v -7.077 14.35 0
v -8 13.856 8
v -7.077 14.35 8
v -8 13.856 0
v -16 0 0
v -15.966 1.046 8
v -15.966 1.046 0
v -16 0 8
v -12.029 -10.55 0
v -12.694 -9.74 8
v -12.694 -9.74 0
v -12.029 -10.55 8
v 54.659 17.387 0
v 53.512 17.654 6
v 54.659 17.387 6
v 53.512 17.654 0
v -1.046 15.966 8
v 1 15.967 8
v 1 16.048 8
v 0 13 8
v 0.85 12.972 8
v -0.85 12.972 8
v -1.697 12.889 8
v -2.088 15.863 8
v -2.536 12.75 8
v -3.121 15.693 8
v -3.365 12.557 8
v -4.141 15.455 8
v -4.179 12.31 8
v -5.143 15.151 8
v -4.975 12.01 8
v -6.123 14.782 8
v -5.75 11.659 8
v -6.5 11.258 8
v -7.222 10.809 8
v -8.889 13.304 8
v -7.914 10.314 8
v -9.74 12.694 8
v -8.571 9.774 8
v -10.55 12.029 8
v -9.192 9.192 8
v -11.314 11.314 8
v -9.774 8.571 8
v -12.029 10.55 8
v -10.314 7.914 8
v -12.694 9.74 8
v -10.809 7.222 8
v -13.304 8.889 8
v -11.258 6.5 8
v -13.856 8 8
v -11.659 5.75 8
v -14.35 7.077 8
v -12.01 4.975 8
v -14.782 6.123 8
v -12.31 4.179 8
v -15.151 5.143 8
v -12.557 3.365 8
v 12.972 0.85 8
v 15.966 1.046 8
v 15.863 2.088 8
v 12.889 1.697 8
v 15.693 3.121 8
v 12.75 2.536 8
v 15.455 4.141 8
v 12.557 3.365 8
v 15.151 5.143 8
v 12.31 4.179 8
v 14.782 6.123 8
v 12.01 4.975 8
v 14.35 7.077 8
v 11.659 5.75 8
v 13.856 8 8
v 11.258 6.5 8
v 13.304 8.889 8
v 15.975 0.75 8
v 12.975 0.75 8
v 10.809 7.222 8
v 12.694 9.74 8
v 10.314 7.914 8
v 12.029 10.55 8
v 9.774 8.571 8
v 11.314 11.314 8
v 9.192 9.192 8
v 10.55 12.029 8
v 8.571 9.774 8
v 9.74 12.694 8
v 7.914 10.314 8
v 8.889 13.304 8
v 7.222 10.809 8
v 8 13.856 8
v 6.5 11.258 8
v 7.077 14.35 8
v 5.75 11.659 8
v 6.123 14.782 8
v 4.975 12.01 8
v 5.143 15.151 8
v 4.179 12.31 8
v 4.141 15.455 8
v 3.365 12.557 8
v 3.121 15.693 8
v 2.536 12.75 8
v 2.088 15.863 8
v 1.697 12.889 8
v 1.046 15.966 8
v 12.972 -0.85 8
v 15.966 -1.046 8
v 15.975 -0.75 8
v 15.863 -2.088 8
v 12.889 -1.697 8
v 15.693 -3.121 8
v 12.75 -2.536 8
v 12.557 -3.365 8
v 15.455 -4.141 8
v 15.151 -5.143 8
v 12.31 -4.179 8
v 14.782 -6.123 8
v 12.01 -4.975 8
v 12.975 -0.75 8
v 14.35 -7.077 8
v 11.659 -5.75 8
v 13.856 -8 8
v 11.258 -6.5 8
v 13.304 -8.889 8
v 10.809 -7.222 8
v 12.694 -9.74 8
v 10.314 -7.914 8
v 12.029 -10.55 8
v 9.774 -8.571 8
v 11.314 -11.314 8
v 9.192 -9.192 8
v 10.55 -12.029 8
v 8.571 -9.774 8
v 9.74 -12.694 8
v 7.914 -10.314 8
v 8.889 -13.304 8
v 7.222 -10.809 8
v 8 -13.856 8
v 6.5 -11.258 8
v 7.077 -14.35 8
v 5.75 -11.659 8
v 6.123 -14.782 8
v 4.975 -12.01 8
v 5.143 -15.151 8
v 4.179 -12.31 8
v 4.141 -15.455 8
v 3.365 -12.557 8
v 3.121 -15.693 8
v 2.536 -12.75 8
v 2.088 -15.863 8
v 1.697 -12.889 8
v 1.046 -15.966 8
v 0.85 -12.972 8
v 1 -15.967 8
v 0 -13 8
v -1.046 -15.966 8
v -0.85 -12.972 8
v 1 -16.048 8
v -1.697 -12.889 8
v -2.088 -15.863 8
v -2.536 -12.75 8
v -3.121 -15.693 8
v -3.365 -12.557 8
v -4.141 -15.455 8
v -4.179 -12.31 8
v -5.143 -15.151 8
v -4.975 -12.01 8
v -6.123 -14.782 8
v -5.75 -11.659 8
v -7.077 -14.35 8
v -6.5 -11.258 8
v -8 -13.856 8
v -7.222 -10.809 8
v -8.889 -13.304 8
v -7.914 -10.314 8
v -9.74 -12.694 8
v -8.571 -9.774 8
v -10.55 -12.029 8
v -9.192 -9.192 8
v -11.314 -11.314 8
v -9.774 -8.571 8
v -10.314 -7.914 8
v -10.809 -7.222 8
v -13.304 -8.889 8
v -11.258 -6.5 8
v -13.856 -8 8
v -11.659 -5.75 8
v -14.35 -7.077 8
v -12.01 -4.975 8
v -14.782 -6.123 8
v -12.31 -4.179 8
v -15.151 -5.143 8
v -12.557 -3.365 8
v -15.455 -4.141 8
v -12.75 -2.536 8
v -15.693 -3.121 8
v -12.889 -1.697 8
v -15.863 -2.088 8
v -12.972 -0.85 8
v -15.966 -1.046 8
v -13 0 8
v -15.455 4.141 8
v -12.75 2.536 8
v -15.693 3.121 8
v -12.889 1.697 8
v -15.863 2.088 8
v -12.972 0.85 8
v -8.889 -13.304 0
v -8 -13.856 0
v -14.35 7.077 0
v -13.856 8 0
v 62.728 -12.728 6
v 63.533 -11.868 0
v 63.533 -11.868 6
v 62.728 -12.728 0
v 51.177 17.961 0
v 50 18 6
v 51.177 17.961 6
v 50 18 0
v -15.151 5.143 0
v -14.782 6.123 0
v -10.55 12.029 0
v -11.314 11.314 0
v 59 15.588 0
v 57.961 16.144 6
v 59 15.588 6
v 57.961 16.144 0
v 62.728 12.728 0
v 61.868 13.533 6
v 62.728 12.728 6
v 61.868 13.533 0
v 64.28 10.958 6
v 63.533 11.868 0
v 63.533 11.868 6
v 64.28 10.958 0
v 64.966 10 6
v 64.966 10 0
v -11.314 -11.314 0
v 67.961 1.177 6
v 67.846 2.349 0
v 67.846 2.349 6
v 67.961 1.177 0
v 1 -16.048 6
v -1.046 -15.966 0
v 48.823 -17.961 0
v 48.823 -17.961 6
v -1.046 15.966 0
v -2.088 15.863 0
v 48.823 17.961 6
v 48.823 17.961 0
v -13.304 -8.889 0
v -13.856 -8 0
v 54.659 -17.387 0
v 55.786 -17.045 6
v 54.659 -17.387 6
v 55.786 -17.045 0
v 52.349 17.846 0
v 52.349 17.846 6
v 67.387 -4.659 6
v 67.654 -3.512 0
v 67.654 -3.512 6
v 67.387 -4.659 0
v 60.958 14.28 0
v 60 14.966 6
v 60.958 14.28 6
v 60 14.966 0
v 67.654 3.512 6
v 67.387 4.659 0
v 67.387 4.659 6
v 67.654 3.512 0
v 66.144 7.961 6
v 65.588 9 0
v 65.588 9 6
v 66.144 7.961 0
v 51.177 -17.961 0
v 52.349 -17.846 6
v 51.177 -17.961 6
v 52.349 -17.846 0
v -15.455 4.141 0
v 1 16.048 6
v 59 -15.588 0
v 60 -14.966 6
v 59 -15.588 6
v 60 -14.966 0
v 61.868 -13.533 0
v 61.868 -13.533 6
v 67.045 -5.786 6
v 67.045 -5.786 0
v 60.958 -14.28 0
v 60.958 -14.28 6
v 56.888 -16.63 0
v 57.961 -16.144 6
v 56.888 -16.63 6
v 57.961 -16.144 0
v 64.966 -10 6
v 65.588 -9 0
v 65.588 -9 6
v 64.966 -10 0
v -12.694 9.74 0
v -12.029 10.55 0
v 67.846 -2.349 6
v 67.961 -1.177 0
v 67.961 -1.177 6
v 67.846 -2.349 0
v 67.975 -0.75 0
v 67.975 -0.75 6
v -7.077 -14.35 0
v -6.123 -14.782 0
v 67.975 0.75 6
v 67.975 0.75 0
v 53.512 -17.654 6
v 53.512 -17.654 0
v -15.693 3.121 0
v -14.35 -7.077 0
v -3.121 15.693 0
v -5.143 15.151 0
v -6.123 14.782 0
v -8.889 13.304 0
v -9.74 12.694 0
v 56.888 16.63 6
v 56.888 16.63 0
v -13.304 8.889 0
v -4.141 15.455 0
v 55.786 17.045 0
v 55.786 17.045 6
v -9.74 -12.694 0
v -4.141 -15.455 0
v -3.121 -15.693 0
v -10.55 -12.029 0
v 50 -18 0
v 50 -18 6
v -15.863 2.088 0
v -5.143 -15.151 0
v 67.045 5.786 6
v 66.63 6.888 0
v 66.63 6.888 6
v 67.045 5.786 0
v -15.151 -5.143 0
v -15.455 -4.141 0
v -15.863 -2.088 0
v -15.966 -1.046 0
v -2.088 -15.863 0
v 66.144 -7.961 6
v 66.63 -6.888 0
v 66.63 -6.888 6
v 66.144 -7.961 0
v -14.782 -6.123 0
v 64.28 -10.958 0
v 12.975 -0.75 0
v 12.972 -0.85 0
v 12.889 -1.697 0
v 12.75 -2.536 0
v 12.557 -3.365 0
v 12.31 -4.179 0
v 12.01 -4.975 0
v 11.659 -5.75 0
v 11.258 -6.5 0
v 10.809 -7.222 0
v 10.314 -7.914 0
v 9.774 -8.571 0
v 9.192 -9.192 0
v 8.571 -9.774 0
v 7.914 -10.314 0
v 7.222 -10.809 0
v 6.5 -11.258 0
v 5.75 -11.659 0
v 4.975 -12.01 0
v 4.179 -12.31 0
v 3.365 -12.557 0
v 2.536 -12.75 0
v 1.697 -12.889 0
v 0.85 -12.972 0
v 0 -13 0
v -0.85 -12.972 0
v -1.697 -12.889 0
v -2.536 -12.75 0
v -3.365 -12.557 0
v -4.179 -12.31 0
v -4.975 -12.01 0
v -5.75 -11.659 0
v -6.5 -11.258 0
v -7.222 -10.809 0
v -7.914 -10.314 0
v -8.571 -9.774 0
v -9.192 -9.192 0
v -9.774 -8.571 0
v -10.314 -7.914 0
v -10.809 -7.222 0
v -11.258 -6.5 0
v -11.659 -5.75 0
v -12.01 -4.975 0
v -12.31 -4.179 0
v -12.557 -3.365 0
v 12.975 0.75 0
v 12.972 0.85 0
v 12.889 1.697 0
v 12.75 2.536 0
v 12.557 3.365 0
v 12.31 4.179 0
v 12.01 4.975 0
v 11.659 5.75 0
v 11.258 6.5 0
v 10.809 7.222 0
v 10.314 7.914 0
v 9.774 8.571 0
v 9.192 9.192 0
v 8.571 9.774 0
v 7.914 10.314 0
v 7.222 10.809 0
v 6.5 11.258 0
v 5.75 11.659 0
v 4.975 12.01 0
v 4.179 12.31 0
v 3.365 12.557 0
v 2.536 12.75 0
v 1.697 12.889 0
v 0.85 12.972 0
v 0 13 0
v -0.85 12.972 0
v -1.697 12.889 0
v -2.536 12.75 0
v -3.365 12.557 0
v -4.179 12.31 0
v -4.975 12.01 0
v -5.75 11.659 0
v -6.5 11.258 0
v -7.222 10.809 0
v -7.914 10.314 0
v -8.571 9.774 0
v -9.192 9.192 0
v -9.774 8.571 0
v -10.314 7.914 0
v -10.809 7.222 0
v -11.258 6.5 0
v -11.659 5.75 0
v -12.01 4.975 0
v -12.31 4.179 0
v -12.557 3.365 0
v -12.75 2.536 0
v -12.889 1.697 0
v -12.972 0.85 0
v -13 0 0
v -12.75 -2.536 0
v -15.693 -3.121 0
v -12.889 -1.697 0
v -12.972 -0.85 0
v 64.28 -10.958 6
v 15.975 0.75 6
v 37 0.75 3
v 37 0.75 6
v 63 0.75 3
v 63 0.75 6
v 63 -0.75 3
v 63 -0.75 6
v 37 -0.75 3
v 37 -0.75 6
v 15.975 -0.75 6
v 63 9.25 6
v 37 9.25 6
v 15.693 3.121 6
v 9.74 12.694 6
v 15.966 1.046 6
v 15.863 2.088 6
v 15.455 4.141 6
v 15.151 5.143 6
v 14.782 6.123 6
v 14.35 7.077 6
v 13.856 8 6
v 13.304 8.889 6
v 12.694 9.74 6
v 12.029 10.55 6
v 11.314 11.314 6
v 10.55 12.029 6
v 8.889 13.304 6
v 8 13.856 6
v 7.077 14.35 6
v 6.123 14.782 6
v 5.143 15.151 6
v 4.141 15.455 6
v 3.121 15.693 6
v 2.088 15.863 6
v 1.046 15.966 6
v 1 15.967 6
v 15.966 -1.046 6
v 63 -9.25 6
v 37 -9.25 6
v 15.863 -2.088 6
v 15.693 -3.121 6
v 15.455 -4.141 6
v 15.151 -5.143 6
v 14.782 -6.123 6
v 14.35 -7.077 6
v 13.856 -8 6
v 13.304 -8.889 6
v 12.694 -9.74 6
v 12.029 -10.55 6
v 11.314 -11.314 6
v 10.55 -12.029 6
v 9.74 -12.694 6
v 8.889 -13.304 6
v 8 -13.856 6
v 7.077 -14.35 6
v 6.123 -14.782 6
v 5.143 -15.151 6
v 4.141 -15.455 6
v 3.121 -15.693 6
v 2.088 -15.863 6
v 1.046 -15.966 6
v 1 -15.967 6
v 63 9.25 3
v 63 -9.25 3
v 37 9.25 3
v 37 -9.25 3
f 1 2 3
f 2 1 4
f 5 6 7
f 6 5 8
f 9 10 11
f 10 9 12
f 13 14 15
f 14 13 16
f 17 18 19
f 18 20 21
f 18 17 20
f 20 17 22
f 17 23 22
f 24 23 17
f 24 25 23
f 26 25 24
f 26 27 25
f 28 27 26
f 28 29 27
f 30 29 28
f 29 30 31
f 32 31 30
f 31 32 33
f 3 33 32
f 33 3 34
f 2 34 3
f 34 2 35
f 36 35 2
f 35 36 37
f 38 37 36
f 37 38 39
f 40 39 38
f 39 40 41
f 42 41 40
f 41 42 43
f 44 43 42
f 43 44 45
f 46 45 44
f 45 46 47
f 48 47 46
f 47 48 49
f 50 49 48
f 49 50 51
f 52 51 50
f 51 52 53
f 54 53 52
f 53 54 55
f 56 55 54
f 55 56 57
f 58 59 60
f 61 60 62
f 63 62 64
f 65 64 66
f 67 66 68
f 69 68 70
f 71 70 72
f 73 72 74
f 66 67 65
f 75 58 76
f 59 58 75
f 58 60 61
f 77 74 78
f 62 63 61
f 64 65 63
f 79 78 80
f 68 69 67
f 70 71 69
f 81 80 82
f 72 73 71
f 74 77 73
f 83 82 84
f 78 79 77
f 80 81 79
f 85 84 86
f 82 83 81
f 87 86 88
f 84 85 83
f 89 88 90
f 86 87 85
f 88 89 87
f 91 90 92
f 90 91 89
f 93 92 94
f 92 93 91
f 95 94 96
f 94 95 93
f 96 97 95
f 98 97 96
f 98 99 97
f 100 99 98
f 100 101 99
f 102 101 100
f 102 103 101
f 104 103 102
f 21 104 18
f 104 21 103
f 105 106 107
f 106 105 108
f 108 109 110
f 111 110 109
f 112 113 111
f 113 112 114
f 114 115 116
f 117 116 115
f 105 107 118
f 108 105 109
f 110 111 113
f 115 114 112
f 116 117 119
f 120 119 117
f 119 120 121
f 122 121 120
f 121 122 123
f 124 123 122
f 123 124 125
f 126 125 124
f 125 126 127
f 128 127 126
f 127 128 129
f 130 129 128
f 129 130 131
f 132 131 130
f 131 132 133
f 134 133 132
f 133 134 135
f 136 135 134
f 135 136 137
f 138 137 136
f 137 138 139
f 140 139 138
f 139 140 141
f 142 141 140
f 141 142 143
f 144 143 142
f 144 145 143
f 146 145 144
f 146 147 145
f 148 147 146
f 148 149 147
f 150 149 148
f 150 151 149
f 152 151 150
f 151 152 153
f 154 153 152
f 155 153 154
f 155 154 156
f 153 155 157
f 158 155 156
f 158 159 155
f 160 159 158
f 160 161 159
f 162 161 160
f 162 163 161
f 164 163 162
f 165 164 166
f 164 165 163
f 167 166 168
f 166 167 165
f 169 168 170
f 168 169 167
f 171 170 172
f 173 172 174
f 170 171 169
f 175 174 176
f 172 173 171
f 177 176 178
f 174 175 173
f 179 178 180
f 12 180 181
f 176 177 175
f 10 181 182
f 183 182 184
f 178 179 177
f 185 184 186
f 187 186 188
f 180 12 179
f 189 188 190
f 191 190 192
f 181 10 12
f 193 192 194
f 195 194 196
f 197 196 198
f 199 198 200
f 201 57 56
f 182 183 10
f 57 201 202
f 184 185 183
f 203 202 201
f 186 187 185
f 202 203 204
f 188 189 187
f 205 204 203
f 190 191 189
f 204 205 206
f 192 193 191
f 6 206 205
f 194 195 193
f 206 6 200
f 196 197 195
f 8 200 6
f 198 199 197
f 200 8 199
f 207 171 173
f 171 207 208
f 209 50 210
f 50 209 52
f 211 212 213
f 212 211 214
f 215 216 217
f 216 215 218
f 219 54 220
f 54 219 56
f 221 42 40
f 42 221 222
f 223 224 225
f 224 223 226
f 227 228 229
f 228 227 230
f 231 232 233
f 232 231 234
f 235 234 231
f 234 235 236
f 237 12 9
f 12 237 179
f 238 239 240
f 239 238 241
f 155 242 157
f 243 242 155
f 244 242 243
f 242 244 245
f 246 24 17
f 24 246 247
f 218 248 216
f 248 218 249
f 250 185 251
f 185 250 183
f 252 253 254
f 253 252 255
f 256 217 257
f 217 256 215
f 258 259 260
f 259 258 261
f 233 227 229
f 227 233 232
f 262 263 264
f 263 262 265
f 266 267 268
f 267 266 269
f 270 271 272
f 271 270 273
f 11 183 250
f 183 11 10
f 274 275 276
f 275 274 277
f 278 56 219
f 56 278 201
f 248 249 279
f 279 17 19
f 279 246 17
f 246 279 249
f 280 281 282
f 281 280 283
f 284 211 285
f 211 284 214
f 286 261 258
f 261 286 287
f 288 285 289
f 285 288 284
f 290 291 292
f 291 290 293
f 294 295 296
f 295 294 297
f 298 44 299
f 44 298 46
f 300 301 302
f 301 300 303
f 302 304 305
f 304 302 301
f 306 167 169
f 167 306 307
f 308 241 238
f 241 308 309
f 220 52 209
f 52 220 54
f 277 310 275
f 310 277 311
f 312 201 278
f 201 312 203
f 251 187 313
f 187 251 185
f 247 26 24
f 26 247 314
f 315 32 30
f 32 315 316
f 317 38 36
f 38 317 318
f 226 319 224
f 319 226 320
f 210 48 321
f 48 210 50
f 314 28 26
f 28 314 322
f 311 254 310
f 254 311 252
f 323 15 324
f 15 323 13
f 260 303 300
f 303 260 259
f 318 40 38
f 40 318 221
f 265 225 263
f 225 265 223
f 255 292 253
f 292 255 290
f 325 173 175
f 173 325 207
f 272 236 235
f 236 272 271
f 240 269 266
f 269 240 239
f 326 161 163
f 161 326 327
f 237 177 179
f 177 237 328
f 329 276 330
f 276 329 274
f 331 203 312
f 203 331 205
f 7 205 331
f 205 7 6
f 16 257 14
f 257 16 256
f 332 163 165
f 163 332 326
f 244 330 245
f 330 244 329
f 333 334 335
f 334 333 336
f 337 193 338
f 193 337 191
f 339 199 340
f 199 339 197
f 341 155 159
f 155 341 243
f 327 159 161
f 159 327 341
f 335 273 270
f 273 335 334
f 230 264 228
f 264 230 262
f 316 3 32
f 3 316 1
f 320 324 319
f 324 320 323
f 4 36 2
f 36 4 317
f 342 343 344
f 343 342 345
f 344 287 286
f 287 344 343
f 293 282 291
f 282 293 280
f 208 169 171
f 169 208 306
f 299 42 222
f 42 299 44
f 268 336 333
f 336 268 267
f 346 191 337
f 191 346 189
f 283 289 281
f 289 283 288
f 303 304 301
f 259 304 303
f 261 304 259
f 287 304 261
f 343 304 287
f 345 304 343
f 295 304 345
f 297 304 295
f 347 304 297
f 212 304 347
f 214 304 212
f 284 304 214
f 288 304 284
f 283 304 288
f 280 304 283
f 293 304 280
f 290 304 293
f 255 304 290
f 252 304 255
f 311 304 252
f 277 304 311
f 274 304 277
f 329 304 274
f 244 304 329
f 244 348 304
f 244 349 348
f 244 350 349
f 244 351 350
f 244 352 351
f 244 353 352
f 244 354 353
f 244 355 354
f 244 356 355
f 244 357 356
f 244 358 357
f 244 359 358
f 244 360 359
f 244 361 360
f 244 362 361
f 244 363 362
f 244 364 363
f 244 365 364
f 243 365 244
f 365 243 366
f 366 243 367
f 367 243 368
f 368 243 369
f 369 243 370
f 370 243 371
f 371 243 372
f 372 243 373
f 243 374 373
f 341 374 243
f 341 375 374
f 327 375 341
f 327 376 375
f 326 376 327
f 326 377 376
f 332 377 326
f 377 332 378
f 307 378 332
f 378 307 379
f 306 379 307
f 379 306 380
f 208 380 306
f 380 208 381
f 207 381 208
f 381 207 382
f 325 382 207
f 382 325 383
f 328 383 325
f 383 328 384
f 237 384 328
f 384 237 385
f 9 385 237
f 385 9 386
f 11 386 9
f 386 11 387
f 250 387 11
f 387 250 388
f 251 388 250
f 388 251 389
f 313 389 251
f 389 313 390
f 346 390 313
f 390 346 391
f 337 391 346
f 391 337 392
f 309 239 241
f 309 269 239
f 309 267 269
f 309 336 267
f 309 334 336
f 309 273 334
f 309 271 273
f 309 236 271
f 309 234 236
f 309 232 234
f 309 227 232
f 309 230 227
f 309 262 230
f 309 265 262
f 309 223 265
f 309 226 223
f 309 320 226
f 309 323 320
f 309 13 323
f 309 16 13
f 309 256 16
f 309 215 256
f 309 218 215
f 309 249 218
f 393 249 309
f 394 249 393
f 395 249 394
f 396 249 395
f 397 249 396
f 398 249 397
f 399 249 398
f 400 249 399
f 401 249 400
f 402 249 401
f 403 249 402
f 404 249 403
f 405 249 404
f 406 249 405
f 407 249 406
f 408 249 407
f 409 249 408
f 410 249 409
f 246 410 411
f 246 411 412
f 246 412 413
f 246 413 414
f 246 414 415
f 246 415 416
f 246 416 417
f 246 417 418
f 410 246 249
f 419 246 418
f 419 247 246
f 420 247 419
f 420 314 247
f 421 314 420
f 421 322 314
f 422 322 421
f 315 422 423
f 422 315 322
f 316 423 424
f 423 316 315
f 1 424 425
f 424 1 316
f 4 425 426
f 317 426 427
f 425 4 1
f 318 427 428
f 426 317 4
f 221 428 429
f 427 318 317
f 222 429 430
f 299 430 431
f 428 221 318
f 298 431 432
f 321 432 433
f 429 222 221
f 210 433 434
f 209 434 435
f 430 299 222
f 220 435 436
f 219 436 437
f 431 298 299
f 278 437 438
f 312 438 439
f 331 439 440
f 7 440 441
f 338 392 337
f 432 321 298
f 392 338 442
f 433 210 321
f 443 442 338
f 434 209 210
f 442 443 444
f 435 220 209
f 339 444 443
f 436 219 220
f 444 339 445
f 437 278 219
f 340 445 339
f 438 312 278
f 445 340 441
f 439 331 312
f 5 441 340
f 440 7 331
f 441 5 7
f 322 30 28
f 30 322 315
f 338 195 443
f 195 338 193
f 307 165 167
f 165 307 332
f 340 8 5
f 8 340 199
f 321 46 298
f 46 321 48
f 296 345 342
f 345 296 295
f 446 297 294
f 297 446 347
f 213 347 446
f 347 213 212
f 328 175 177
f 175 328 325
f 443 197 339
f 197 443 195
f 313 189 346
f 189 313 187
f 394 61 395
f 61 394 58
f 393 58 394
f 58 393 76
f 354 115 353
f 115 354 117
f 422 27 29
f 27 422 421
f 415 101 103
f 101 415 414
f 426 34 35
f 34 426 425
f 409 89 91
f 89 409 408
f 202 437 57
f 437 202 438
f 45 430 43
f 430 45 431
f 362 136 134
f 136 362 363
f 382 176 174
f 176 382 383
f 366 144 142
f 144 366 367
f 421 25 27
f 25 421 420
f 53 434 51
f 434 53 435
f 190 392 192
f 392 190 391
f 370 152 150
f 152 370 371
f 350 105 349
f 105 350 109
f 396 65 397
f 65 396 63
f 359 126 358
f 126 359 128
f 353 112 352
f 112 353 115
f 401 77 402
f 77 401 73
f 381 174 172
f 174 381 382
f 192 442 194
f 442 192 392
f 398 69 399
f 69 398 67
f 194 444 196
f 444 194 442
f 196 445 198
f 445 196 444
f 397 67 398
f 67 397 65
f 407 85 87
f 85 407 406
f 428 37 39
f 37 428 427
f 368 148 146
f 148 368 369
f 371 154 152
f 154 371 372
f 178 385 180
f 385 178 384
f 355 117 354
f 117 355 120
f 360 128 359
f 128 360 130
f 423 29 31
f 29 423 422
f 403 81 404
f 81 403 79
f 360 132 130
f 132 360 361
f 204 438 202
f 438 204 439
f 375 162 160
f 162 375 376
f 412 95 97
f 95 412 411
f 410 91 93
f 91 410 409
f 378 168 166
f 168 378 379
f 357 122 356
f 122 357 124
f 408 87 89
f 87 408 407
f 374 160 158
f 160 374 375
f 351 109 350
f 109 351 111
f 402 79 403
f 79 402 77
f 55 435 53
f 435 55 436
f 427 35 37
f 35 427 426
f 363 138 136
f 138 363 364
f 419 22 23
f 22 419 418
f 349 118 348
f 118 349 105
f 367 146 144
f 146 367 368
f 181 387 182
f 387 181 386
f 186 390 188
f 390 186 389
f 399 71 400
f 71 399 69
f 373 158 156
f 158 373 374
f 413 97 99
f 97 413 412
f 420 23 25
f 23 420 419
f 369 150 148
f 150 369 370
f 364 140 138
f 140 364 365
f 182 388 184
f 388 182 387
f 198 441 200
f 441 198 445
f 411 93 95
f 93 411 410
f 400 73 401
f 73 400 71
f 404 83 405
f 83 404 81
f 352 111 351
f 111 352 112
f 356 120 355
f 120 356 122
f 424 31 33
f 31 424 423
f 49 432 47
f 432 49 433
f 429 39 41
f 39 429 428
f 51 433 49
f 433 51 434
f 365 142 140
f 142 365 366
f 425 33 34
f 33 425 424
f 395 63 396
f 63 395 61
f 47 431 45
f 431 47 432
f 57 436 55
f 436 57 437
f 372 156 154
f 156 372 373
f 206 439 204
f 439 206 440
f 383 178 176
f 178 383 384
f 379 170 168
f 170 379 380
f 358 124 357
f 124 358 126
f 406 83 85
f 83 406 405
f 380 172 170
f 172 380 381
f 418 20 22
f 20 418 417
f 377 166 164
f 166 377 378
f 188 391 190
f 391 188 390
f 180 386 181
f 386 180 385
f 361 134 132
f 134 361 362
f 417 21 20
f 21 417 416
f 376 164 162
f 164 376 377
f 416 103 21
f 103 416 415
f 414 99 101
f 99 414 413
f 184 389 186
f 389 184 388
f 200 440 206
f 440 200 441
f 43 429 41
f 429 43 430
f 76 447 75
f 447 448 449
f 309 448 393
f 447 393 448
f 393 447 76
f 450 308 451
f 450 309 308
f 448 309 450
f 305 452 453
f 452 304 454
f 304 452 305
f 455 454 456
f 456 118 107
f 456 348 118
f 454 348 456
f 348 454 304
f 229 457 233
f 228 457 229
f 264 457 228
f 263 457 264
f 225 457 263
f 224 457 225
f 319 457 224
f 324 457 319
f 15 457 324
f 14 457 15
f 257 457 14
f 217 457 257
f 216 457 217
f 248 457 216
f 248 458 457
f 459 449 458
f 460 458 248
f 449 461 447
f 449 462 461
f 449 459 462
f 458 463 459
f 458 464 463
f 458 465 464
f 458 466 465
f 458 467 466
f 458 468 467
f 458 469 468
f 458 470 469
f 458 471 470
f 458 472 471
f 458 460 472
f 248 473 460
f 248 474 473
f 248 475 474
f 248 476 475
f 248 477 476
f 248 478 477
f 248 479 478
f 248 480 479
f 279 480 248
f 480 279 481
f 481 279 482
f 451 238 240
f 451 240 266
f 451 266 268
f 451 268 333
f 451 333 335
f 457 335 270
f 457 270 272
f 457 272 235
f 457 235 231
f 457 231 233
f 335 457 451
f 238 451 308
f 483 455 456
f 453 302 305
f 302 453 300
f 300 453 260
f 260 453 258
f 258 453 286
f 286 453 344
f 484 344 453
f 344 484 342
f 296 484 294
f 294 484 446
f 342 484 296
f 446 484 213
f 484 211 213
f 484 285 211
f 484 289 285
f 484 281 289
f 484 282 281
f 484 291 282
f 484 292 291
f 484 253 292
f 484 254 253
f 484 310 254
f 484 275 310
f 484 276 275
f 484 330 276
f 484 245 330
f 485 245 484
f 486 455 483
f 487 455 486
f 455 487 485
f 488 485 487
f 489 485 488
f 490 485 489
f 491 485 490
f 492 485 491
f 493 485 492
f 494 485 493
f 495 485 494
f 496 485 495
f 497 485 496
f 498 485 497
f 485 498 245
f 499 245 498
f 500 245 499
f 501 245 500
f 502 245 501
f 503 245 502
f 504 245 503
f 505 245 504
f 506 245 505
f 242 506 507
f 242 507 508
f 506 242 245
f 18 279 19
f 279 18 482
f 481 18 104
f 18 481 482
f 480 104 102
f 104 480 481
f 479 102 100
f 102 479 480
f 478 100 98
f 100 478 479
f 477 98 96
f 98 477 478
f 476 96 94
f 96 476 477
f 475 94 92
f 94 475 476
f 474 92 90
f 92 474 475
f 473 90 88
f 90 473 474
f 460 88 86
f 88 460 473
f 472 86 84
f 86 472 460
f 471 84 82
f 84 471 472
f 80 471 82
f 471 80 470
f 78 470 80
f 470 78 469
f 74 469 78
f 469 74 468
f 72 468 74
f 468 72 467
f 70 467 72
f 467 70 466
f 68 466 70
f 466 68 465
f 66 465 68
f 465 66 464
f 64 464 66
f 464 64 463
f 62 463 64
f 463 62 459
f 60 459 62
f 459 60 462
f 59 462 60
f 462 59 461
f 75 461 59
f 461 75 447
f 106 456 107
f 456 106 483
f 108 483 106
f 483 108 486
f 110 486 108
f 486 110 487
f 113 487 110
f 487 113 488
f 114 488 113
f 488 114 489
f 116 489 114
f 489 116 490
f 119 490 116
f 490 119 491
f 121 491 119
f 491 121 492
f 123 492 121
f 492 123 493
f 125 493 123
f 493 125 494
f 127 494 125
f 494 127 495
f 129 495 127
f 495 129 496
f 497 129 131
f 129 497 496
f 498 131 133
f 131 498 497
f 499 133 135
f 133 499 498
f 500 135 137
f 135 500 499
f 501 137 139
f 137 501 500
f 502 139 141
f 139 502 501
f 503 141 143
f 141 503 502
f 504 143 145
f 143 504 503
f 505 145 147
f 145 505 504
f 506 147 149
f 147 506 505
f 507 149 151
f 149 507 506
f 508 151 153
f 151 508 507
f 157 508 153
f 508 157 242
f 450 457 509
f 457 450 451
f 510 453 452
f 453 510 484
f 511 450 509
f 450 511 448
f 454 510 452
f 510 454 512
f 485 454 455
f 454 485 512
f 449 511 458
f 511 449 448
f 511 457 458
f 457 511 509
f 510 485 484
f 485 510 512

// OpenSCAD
// file: model.scad
// GV30 lux add-on: a split ring between the clamp's stub shoulder and the GV30, with an arm carrying a
// lux sensor. The split runs down the arm's middle, so it opens around the coax and the cord can lie in it.
// A cover drops into a recess over the arm, flush with the ring's top, and is thinned to a skin over the
// sensor: the diffuser.
// Origin: antenna axis on Z, z = 0 on the stub's shoulder.
// Print: body as shown; cover upside down (skin on the bed).

part = "assembly";   // [body, cover, assembly]

/* [Ring] */
od = 32;            // the shoulder it sits on, off ref/clamp-upper.stl
id = 26;            // over the 1"-14 stub (OD 25.2)
h = 8;              // costs this much thread engagement (GV30 thread depth not measured)
split = 1.5;        // gap

/* [Arm and head] */
reach = 50;         // antenna axis to sensor centre
head_d = 36;

/* [Sensor: VEML7700, Adafruit 4162, 25.4 x 17.8 (vendor; not measured)] */
board_l = 26;
board_w = 18.5;
pocket = 3;         // below the cover: board 1.6 and its parts

/* [Cover] */
cover_t = 2;
skin = 0.6;         // white ASA over the sensor, 3 layers at 0.2
fit = 0.2;          // cover to recess, each side

$fn = 96;
e = 0.01;

module outline() hull() { circle(d = od); translate([reach, 0]) circle(d = head_d); }

// the arm's part of the outline: everything outside the ring
module arm_outline(grow = 0, spill = 0) intersection() {
  difference() { offset(delta = grow + spill) outline(); circle(d = od - 2 * grow); }
  translate([1, -head_d]) square([reach + head_d, 2 * head_d]);   // keeps off the ring's tangent points
}

module body() {
  difference() {
    linear_extrude(h) outline();
    translate([0, 0, -e]) cylinder(d = id, h = h + 2 * e);
    translate([0, -split / 2, -e]) cube([reach + head_d, split, h + 2 * e]);
    translate([0, 0, h - cover_t]) linear_extrude(cover_t + e) arm_outline(spill = 1);
    translate([reach - board_l / 2, -board_w / 2, h - cover_t - pocket]) cube([board_l, board_w, pocket + e]);
  }
}

module cover() {
  // z = 0 is the underside
  difference() {
    linear_extrude(cover_t) arm_outline(-fit);
    translate([reach - board_l / 2, -board_w / 2, -e]) cube([board_l, board_w, cover_t - skin + e]);
  }
}

module assembly() {
  color("lightgrey") body();
  color("white") translate([0, 0, h - cover_t]) cover();
}

if (part == "body") body();
else if (part == "cover") cover();
else assembly();
// main file
// The body: split ring and arm. Prints as shown.
include <model.scad>
part = "body";
